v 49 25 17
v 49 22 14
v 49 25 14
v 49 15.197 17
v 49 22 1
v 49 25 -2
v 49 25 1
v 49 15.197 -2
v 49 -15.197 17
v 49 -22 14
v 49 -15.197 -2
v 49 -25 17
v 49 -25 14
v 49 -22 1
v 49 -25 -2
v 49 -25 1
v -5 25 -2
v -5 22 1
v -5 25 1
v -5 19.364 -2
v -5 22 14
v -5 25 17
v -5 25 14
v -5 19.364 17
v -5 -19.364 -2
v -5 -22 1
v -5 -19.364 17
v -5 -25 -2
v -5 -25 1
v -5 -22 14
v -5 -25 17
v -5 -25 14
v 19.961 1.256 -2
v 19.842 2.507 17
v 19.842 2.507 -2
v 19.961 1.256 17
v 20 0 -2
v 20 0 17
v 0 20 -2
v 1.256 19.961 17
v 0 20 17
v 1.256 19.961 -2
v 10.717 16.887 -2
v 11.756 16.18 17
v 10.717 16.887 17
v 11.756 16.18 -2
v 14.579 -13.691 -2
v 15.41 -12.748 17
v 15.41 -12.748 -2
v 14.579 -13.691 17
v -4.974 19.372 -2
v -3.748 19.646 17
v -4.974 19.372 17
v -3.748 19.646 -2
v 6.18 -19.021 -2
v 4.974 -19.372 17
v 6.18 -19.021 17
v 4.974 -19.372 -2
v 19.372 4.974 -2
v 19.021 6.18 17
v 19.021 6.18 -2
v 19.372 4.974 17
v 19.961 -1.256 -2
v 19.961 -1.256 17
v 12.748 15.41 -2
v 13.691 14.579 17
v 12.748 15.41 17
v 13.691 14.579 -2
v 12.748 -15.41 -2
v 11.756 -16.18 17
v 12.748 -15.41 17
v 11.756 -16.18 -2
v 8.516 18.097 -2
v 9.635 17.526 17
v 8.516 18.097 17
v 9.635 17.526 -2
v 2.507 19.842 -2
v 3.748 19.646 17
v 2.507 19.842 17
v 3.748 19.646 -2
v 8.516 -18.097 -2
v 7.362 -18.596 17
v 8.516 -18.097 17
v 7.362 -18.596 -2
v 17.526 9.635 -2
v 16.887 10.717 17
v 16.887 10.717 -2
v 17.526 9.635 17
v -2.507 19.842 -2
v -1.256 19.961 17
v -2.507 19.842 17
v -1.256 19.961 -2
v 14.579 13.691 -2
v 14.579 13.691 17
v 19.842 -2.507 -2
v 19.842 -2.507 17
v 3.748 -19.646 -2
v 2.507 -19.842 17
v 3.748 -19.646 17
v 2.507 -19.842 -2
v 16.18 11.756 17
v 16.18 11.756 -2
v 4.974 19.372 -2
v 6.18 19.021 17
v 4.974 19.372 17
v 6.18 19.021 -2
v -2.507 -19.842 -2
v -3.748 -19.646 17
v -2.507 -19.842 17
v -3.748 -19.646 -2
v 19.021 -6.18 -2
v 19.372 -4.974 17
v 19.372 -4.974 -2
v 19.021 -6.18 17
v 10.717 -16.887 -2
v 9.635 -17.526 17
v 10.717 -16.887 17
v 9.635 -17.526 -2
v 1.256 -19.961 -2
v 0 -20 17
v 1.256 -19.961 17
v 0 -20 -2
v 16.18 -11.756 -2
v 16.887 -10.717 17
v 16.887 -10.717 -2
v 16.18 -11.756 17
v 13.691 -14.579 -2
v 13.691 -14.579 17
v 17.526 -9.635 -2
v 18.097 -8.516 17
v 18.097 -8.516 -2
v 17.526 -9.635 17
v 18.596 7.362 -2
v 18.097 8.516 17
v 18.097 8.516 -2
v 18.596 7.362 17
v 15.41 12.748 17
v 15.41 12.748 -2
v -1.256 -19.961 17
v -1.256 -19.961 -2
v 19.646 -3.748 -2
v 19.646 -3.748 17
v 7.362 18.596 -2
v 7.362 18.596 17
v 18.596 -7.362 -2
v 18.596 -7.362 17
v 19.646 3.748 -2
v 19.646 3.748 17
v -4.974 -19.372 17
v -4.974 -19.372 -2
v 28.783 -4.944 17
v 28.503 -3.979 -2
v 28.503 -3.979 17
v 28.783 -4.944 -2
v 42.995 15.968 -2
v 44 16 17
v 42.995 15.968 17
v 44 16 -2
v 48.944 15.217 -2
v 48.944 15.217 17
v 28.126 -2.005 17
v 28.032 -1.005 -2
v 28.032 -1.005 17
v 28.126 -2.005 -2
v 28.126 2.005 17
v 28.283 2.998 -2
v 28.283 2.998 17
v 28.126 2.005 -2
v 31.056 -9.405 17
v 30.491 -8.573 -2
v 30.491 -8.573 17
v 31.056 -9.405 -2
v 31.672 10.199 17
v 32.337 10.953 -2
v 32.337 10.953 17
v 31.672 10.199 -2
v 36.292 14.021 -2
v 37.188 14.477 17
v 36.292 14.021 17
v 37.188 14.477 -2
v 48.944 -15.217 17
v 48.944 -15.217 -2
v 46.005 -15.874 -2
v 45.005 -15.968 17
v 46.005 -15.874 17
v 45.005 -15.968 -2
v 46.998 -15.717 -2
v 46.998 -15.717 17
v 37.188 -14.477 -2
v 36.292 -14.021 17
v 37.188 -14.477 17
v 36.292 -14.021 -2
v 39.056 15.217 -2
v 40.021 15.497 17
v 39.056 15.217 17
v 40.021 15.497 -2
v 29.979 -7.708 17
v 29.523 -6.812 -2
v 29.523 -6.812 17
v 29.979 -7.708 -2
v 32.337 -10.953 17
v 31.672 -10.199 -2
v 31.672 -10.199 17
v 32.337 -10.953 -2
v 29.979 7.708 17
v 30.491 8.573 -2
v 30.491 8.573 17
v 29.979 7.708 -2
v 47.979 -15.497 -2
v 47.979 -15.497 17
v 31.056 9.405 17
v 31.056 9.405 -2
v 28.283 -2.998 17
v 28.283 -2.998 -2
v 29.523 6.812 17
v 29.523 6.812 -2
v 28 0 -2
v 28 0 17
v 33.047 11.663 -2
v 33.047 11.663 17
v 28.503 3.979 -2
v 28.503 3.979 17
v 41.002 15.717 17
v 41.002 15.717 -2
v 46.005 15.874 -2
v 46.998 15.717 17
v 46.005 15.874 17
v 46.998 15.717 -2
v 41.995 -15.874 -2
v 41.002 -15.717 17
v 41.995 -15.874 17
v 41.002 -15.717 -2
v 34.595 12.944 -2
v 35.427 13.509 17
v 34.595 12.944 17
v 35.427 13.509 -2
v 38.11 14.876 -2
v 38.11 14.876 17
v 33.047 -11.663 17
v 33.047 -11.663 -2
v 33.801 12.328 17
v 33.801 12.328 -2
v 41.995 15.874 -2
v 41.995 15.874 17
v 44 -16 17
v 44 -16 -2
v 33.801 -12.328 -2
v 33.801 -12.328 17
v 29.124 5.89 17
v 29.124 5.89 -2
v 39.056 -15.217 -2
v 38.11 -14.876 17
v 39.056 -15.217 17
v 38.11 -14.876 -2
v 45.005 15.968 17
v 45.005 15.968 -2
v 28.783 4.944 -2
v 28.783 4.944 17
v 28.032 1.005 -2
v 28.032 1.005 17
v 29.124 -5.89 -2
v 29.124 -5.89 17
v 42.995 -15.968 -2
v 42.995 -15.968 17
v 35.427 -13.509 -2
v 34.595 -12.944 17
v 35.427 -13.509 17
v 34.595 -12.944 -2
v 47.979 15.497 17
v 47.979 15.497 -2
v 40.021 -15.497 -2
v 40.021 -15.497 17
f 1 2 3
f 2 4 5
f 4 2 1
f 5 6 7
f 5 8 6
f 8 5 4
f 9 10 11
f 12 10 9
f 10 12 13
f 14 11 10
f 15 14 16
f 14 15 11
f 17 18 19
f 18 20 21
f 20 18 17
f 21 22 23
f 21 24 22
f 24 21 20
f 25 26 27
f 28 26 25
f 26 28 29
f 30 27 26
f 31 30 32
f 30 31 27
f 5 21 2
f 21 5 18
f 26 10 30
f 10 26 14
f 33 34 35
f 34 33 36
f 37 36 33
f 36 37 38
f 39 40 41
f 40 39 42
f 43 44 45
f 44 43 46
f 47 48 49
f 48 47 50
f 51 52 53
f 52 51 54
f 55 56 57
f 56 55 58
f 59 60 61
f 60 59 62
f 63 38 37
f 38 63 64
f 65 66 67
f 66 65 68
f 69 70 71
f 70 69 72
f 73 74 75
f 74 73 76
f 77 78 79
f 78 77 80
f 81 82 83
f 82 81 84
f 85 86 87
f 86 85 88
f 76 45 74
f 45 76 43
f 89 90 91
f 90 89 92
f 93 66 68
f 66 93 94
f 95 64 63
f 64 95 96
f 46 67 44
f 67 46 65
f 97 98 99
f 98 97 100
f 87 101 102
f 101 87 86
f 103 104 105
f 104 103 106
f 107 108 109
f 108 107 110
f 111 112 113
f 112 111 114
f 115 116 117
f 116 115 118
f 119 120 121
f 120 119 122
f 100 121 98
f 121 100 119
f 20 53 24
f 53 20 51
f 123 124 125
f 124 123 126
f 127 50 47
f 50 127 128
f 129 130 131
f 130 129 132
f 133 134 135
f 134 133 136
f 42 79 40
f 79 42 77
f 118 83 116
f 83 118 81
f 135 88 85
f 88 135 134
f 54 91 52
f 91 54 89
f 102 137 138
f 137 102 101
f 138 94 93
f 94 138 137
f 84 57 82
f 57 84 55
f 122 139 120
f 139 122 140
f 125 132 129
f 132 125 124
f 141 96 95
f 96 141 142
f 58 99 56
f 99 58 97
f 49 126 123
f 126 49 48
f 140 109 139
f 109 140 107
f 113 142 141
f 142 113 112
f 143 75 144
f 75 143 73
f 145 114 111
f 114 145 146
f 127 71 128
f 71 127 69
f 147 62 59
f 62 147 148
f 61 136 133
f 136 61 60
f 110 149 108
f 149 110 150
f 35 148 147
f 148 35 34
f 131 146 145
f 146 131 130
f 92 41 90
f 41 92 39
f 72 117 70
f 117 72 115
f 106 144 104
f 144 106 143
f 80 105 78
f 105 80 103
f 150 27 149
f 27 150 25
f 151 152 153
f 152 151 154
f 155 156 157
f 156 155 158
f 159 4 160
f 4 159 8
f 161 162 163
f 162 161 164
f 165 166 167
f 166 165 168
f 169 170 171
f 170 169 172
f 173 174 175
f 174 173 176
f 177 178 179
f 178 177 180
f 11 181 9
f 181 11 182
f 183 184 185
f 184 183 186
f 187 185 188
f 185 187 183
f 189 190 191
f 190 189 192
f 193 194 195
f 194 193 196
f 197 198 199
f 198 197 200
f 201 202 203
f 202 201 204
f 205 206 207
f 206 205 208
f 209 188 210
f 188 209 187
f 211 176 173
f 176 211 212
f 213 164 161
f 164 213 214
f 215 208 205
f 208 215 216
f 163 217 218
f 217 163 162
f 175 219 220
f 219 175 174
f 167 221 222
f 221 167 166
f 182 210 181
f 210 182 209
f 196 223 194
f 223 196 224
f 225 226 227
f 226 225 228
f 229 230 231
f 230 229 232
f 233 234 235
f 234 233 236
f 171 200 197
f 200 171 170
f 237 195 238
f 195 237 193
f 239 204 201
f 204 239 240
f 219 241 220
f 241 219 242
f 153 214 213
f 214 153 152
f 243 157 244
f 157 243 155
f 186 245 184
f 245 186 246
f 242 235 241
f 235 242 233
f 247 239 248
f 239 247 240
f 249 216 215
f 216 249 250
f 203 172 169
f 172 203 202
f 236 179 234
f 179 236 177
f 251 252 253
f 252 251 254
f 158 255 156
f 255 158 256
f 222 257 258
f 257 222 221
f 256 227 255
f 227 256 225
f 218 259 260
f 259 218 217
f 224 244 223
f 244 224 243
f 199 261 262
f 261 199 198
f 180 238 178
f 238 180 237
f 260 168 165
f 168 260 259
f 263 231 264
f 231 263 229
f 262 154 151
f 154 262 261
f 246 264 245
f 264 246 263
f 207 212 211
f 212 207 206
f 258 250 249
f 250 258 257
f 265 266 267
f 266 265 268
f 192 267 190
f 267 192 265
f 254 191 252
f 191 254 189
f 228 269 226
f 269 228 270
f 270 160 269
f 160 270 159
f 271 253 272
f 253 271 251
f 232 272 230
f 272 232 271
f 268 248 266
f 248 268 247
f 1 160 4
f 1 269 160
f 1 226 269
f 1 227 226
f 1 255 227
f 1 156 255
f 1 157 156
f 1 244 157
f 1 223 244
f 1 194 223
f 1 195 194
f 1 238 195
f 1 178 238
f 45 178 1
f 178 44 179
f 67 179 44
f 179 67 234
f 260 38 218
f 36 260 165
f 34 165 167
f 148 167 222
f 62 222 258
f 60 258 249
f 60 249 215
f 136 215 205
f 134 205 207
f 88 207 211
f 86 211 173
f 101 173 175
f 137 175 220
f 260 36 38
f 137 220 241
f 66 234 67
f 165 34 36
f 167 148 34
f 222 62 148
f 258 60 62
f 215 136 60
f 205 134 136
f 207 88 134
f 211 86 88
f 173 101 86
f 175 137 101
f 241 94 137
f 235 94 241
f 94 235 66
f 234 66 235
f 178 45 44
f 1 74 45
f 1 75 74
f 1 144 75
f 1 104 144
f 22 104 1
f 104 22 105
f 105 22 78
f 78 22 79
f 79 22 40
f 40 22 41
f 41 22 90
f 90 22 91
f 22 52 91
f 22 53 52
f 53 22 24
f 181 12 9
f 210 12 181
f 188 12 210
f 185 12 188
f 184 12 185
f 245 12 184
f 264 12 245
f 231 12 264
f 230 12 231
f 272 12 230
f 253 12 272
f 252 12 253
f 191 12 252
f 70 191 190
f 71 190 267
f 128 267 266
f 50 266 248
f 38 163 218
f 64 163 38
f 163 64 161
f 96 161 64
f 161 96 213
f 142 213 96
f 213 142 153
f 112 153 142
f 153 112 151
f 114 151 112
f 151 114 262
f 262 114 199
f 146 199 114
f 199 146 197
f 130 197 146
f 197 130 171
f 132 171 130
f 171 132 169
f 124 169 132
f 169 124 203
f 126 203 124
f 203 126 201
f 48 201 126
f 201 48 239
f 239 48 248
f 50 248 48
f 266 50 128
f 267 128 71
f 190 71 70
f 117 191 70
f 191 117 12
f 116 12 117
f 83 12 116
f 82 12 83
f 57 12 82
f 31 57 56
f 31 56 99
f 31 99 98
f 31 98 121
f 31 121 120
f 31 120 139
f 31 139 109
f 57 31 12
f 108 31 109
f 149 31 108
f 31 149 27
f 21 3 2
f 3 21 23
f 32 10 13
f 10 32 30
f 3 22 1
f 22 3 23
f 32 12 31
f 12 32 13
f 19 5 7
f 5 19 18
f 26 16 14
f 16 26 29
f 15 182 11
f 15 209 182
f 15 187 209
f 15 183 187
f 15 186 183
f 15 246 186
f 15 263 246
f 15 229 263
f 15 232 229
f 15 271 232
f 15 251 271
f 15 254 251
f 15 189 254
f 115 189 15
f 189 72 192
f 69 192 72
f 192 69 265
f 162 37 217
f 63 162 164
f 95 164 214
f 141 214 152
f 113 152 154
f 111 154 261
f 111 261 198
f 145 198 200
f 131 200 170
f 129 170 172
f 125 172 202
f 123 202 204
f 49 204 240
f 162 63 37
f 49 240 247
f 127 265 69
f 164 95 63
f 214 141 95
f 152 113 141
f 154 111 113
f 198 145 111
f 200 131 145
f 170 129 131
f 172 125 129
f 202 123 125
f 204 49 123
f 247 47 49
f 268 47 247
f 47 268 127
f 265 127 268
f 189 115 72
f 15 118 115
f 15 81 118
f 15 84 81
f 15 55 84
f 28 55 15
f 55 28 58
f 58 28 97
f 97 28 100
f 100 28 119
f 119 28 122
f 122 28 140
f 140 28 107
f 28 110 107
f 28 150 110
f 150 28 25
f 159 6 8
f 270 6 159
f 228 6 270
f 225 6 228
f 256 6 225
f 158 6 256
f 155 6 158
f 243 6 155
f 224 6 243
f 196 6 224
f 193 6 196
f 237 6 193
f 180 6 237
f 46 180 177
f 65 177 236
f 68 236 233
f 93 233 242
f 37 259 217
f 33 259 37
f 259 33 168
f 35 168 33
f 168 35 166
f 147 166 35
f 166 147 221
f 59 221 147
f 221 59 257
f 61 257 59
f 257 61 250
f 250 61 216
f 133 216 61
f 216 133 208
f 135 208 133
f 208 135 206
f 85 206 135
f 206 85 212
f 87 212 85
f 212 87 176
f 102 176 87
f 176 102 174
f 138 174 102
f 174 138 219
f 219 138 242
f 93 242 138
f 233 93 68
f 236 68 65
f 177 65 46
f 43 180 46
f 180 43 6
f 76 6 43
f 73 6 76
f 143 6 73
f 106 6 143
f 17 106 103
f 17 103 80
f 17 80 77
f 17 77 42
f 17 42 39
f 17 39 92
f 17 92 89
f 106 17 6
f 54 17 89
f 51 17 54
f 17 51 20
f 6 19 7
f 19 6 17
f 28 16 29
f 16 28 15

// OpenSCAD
$fn=100;

//tripod radii (R1) are 17.5, 19, 21
//PVC radii (R2) are 16.5 (1" pipe), 20 (fitting)
//3/4 GI - 13.5

//cube offset (CuO) = 5
//center offset (CeO) = 19 + 20 + 10 = 49
//cube length (CL) = CeO + CuO*2


R1 = 20; 
R2 = 16;
CuO = 5;
CeO = CuO+R1+R2+3;
CL = CeO + CuO*2;


//////////////////////////////////////////////////////////////////////////
difference(){
    translate([-CuO,-CeO/2,0]) cube([CL,CeO,15]);
    translate([0,0,-1]) cylinder(20,R1,R1);
    translate([CeO,0,-1])cylinder(20,R2,R2);
    }

translate([0,0,14]) difference(){
    translate([-CuO,(-CeO/2)-3,0]) cube([CL,CeO+6,3]);
    translate([0,0,-1]) cylinder(20,R1,R1);
    translate([CeO,0,-1])cylinder(20,R2,R2);
    }

translate([0,0,-2])difference(){
    translate([-CuO,(-CeO/2)-3,0]) cube([CL,CeO+6,3]);
    translate([0,0,-1]) cylinder(20,R1,R1);
    translate([CeO,0,-1])cylinder(20,R2,R2);
    }
